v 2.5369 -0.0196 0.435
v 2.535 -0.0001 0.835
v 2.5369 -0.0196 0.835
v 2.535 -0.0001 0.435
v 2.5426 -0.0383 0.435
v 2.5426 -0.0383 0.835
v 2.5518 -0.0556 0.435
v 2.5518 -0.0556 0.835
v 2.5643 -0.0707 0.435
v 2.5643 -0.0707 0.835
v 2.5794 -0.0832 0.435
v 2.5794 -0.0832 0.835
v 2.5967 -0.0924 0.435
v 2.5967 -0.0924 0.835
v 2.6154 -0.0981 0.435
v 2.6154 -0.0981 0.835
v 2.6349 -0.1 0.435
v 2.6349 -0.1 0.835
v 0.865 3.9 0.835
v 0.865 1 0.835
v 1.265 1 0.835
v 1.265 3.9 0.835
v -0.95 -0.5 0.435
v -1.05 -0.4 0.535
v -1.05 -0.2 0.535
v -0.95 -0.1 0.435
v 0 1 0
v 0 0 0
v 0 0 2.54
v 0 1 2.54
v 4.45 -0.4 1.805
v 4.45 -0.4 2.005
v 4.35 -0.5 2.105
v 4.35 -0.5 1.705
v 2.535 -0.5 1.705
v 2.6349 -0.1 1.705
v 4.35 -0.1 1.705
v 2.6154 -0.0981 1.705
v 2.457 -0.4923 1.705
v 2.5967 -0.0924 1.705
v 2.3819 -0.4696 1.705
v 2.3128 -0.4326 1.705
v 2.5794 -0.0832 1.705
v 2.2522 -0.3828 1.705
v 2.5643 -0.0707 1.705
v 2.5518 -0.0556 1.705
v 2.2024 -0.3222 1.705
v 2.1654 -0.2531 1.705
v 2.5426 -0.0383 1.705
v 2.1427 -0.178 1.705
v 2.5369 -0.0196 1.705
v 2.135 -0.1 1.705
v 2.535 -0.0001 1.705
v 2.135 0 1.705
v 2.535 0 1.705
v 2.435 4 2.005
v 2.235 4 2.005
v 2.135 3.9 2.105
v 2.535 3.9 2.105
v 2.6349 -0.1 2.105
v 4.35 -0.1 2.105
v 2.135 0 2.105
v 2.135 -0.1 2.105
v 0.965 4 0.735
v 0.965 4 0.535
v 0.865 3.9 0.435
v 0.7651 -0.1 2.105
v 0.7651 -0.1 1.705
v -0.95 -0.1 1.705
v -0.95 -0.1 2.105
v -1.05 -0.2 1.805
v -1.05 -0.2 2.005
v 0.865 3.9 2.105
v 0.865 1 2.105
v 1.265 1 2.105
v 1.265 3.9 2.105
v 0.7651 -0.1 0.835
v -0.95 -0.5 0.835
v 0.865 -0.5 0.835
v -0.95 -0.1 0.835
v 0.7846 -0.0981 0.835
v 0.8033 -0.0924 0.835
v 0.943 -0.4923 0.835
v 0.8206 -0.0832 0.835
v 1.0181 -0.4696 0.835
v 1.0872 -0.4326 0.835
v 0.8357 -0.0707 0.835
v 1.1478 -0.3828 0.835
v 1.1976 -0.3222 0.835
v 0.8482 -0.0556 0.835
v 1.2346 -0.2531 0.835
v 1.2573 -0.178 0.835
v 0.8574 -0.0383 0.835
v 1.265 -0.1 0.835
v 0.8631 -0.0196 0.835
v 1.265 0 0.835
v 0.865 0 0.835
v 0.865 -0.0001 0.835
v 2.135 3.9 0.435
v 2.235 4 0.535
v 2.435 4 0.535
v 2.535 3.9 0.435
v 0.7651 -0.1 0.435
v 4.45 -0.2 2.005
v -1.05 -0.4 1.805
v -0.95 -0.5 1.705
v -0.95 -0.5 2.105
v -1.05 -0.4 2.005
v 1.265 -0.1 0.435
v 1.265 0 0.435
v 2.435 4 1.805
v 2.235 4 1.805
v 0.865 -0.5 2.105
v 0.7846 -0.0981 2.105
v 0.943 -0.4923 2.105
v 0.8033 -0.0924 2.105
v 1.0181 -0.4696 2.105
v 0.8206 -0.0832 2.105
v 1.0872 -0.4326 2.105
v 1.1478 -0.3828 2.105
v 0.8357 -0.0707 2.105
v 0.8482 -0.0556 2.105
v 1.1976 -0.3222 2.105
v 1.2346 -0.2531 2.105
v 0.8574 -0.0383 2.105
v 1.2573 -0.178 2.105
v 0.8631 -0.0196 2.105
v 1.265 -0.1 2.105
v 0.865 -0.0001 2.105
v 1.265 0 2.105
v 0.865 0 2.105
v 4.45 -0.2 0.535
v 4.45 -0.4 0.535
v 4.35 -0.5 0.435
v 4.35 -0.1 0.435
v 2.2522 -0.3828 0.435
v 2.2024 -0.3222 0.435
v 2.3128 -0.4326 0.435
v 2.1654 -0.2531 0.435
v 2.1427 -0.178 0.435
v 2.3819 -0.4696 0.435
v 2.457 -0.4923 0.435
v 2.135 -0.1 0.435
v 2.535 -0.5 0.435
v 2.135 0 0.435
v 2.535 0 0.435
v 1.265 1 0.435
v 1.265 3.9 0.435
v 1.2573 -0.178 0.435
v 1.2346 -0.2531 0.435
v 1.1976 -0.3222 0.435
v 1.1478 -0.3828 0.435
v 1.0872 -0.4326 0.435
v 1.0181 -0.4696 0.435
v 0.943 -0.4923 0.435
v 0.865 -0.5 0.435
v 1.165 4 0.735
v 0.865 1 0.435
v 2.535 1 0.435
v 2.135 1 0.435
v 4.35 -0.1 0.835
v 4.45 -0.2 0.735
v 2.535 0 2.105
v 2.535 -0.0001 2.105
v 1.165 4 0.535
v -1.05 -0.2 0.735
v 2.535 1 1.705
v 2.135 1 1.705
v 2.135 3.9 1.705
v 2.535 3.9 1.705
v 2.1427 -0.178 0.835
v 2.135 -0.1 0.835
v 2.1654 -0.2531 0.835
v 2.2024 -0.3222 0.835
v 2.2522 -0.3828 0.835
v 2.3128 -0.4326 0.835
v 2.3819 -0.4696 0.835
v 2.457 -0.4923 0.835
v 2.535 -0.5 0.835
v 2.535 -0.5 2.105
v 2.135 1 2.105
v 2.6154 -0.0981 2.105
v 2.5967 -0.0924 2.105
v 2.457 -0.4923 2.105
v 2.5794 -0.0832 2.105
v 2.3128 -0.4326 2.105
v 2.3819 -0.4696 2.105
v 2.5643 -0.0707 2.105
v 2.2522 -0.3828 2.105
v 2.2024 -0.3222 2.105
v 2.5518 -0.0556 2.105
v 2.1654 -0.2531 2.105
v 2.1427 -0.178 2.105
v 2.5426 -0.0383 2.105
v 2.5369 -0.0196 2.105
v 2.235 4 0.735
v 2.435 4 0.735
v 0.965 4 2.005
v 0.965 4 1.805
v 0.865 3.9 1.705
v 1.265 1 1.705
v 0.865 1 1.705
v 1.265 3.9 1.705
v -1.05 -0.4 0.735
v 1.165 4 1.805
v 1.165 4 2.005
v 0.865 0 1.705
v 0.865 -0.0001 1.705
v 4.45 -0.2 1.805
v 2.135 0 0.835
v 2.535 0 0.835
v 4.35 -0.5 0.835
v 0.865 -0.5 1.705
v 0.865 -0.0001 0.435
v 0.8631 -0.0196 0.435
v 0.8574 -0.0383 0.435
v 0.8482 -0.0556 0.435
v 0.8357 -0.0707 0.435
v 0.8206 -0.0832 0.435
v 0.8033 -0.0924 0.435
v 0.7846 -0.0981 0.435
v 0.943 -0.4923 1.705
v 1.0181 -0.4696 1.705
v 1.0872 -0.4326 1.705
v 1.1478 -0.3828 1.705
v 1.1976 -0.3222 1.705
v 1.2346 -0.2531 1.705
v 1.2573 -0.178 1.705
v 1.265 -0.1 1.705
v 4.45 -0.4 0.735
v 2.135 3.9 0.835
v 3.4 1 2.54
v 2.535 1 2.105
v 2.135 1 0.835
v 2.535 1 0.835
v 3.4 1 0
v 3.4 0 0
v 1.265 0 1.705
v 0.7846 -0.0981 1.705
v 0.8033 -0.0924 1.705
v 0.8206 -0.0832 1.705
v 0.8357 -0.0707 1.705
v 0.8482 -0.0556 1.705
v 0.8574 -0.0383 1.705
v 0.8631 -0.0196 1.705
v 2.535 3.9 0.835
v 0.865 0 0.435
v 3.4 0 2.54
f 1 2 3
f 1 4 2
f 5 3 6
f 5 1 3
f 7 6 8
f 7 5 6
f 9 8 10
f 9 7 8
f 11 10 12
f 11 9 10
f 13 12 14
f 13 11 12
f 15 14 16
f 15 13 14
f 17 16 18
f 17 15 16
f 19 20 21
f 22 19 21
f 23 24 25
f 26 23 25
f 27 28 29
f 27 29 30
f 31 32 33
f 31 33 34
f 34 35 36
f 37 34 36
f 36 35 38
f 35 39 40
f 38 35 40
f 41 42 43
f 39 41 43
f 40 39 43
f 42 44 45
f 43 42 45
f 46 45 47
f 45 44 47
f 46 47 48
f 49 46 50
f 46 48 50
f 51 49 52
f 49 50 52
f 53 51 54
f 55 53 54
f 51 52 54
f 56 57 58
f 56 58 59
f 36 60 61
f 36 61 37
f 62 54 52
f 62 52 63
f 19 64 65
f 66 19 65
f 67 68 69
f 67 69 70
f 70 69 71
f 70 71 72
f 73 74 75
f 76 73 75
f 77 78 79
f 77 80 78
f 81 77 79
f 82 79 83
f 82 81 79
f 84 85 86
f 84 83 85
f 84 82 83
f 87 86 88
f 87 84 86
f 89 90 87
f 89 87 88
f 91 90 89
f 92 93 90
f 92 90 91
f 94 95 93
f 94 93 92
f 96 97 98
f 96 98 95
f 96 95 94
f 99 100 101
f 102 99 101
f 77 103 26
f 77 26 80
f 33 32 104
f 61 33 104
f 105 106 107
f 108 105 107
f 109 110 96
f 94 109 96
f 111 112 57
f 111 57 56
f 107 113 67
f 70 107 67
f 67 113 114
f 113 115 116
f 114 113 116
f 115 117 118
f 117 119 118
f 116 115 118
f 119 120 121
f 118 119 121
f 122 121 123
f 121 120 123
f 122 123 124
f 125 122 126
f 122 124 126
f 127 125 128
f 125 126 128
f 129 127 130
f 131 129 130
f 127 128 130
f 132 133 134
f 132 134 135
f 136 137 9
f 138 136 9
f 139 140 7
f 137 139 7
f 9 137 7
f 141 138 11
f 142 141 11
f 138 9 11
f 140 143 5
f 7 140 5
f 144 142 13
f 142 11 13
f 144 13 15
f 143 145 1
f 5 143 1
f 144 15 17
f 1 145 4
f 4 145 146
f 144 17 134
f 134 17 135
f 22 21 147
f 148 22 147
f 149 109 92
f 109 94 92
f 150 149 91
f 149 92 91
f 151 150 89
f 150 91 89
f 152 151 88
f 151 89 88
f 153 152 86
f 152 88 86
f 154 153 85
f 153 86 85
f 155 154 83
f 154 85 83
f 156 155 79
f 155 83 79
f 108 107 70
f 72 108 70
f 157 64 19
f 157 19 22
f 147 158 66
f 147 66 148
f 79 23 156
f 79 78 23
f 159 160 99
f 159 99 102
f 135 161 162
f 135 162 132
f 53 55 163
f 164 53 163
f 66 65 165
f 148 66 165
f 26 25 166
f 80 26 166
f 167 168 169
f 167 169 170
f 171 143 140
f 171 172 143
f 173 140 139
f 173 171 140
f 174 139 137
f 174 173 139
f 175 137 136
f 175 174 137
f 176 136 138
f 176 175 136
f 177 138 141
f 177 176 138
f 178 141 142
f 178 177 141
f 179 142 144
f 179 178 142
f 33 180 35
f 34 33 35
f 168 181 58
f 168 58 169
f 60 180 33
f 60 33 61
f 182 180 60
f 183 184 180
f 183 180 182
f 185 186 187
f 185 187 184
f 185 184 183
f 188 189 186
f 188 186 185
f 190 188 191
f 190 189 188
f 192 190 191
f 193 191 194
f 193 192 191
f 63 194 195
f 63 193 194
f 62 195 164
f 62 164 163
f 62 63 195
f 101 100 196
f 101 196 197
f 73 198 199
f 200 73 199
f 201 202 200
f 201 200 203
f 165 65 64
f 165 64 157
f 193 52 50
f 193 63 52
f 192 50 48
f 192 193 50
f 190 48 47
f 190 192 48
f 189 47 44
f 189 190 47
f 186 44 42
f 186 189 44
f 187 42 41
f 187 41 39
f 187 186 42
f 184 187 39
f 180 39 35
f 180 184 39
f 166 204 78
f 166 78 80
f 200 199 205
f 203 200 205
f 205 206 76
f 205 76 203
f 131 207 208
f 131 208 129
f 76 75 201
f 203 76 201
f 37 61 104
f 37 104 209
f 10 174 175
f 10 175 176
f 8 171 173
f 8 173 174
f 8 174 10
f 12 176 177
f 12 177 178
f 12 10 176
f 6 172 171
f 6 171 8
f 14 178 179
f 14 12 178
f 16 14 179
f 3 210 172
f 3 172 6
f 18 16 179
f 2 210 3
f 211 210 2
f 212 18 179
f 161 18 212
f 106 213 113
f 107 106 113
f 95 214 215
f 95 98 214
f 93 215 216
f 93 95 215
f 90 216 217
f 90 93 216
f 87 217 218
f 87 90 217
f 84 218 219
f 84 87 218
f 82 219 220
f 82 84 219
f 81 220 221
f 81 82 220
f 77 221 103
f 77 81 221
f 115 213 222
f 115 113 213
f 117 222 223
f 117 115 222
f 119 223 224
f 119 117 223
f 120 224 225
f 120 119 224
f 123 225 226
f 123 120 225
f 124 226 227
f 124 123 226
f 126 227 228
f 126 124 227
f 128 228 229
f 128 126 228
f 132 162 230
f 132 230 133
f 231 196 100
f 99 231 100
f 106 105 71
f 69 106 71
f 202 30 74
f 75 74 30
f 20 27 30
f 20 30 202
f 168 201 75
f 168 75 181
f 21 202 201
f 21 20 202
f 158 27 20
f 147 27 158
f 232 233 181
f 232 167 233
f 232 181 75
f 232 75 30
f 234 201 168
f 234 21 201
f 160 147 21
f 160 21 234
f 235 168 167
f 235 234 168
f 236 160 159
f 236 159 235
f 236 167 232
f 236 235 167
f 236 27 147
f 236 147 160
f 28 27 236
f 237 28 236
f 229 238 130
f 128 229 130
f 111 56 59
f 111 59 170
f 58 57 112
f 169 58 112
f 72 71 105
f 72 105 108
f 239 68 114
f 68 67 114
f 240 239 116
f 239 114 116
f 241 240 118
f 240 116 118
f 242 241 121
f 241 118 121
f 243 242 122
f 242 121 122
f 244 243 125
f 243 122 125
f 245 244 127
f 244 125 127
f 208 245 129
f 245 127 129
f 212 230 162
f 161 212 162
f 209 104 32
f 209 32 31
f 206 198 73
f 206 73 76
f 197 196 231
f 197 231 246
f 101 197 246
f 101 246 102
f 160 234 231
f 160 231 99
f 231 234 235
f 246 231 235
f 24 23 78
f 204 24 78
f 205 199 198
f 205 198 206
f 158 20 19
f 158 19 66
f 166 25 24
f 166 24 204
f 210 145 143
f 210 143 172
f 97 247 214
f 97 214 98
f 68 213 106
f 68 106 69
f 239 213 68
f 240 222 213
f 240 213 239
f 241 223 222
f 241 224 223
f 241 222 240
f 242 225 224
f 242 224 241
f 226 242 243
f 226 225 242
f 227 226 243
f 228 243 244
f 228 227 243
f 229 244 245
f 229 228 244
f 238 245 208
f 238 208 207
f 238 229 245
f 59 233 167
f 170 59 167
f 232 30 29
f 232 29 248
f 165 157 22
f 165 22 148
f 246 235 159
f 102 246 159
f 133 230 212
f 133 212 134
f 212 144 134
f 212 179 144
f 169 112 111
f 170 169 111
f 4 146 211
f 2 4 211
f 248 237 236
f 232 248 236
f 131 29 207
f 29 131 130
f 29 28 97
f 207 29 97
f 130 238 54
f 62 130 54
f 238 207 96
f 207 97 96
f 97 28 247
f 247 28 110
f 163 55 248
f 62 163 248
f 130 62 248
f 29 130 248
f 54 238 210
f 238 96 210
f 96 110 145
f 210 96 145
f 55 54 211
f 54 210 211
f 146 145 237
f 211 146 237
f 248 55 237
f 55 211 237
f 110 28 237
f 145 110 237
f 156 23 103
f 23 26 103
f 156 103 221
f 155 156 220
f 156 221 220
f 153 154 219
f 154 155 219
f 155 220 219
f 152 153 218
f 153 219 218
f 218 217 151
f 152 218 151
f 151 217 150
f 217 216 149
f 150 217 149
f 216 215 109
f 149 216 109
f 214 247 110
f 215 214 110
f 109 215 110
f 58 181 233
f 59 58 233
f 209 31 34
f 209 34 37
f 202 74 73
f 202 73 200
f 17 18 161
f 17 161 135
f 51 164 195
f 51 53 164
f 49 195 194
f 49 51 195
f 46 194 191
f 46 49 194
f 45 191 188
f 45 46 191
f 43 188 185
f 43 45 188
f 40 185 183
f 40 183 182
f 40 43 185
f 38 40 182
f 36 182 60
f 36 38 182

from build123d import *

# Parameters (mm, degrees)
SKIZZE1_W                       = 3.4
SKIZZE1_H                       = 1
AUFSATZ_LINEAR_AUSTRAGEN1_DEPTH = 2.54
SKIZZE3_W                       = 0.4
SKIZZE3_H                       = 0.4
AUFSATZ_LINEAR_AUSTRAGEN3_DEPTH = 0.5
SKIZZE4_W                       = 0.4
SKIZZE4_H                       = 0.4
AUFSATZ_LINEAR_AUSTRAGEN4_DEPTH = 1.915
SKIZZE5_W                       = 0.4
SKIZZE5_H                       = 0.4
AUFSATZ_LINEAR_AUSTRAGEN5_DEPTH = 1.915
SKIZZE6_W                       = 0.4
SKIZZE6_H                       = 0.4
AUFSATZ_LINEAR_AUSTRAGEN6_DEPTH = 3
FASE2_SIZE                      = 0.1
VERRUNDUNG1_R                   = 0.1
VERRUNDUNG2_R                   = 0.4


with BuildPart() as part:
    # Skizze1 → Aufsatz-Linear austragen1 (new body)
    with BuildSketch(Plane.XY):
        with Locations((1.7, 0.5)):
            Rectangle(SKIZZE1_W, SKIZZE1_H)
    extrude(amount=AUFSATZ_LINEAR_AUSTRAGEN1_DEPTH)

    # Skizze3 → Aufsatz-Linear austragen3 (add)
    with BuildSketch(Plane.XZ):
        with Locations((1.065, 1.905)):
            Rectangle(SKIZZE3_W, SKIZZE3_H)
        with Locations((2.335, 1.905)):
            Rectangle(SKIZZE3_W, SKIZZE3_H)
        with Locations((1.065, 0.635)):
            Rectangle(SKIZZE3_W, SKIZZE3_H)
        with Locations((2.335, 0.635)):
            Rectangle(SKIZZE3_W, SKIZZE3_H)
    extrude(amount=AUFSATZ_LINEAR_AUSTRAGEN3_DEPTH)

    # Skizze4 → Aufsatz-Linear austragen4 (add)
    with BuildSketch(Plane(origin=(2.535, 0, 0), x_dir=(0, 0, -1), z_dir=(1, 0, 0))):
        with Locations((-1.905, -0.3)):
            Rectangle(SKIZZE4_W, SKIZZE4_H)
        with Locations((-0.635, -0.3)):
            Rectangle(SKIZZE4_W, SKIZZE4_H)
    extrude(amount=AUFSATZ_LINEAR_AUSTRAGEN4_DEPTH)

    # Skizze5 → Aufsatz-Linear austragen5 (add)
    with BuildSketch(Plane.ZY.offset(-0.865)):
        with Locations((1.905, -0.3)):
            Rectangle(SKIZZE5_W, SKIZZE5_H)
        with Locations((0.635, -0.3)):
            Rectangle(SKIZZE5_W, SKIZZE5_H)
    extrude(amount=AUFSATZ_LINEAR_AUSTRAGEN5_DEPTH)

    # Skizze6 → Aufsatz-Linear austragen6 (add)
    with BuildSketch(Plane(origin=(0, 1, 0), x_dir=(1, 0, 0), z_dir=(0, 1, 0))):
        with Locations((1.065, -0.635)):
            Rectangle(SKIZZE6_W, SKIZZE6_H)
        with Locations((2.335, -0.635)):
            Rectangle(SKIZZE6_W, SKIZZE6_H)
        with Locations((1.065, -1.905)):
            Rectangle(SKIZZE6_W, SKIZZE6_H)
        with Locations((2.335, -1.905)):
            Rectangle(SKIZZE6_W, SKIZZE6_H)
    extrude(amount=AUFSATZ_LINEAR_AUSTRAGEN6_DEPTH)

    # Fase2
    fase2_edges = [part.edges().sort_by_distance(p)[0] for p in [
        (-1.05, -0.3, 0.435),
        (-1.05, -0.5, 0.635),
        (1.265, 4, 0.635),
        (1.065, 4, 0.435),
        (0.865, 4, 0.635),
        (1.065, 4, 0.835),
        (2.535, 4, 0.635),
        (2.335, 4, 0.435),
        (2.135, 4, 0.635),
        (2.335, 4, 0.835),
        (1.265, 4, 1.905),
        (1.065, 4, 1.705),
        (0.865, 4, 1.905),
        (1.065, 4, 2.105),
        (2.535, 4, 1.905),
        (2.335, 4, 1.705),
        (2.135, 4, 1.905),
        (2.335, 4, 2.105),
        (4.45, -0.3, 2.105),
        (4.45, -0.5, 1.905),
        (4.45, -0.3, 1.705),
        (4.45, -0.1, 1.905),
        (4.45, -0.3, 0.835),
        (4.45, -0.5, 0.635),
        (4.45, -0.3, 0.435),
        (4.45, -0.1, 0.635),
        (-1.05, -0.3, 2.105),
        (-1.05, -0.1, 1.905),
        (-1.05, -0.3, 1.705),
        (-1.05, -0.5, 1.905),
        (-1.05, -0.3, 0.835),
        (-1.05, -0.1, 0.635),
    ]]
    chamfer(fase2_edges, length=FASE2_SIZE)

    # Verrundung1
    verrundung1_edges = [part.edges().sort_by_distance(p)[0] for p in [
        (0.865, -0.1, 1.905),
        (0.865, -0.1, 0.635),
        (2.535, -0.1, 1.905),
        (2.535, -0.1, 0.635),
    ]]
    fillet(verrundung1_edges, radius=VERRUNDUNG1_R - 0.0001)  # a hair under: the kernel refuses the full size

    # Verrundung2
    verrundung2_edges = [part.edges().sort_by_distance(p)[0] for p in [
        (1.265, -0.5, 1.905),
        (2.135, -0.5, 1.905),
        (1.265, -0.5, 0.635),
        (2.135, -0.5, 0.635),
    ]]
    fillet(verrundung2_edges, radius=VERRUNDUNG2_R)


solid = part.part
